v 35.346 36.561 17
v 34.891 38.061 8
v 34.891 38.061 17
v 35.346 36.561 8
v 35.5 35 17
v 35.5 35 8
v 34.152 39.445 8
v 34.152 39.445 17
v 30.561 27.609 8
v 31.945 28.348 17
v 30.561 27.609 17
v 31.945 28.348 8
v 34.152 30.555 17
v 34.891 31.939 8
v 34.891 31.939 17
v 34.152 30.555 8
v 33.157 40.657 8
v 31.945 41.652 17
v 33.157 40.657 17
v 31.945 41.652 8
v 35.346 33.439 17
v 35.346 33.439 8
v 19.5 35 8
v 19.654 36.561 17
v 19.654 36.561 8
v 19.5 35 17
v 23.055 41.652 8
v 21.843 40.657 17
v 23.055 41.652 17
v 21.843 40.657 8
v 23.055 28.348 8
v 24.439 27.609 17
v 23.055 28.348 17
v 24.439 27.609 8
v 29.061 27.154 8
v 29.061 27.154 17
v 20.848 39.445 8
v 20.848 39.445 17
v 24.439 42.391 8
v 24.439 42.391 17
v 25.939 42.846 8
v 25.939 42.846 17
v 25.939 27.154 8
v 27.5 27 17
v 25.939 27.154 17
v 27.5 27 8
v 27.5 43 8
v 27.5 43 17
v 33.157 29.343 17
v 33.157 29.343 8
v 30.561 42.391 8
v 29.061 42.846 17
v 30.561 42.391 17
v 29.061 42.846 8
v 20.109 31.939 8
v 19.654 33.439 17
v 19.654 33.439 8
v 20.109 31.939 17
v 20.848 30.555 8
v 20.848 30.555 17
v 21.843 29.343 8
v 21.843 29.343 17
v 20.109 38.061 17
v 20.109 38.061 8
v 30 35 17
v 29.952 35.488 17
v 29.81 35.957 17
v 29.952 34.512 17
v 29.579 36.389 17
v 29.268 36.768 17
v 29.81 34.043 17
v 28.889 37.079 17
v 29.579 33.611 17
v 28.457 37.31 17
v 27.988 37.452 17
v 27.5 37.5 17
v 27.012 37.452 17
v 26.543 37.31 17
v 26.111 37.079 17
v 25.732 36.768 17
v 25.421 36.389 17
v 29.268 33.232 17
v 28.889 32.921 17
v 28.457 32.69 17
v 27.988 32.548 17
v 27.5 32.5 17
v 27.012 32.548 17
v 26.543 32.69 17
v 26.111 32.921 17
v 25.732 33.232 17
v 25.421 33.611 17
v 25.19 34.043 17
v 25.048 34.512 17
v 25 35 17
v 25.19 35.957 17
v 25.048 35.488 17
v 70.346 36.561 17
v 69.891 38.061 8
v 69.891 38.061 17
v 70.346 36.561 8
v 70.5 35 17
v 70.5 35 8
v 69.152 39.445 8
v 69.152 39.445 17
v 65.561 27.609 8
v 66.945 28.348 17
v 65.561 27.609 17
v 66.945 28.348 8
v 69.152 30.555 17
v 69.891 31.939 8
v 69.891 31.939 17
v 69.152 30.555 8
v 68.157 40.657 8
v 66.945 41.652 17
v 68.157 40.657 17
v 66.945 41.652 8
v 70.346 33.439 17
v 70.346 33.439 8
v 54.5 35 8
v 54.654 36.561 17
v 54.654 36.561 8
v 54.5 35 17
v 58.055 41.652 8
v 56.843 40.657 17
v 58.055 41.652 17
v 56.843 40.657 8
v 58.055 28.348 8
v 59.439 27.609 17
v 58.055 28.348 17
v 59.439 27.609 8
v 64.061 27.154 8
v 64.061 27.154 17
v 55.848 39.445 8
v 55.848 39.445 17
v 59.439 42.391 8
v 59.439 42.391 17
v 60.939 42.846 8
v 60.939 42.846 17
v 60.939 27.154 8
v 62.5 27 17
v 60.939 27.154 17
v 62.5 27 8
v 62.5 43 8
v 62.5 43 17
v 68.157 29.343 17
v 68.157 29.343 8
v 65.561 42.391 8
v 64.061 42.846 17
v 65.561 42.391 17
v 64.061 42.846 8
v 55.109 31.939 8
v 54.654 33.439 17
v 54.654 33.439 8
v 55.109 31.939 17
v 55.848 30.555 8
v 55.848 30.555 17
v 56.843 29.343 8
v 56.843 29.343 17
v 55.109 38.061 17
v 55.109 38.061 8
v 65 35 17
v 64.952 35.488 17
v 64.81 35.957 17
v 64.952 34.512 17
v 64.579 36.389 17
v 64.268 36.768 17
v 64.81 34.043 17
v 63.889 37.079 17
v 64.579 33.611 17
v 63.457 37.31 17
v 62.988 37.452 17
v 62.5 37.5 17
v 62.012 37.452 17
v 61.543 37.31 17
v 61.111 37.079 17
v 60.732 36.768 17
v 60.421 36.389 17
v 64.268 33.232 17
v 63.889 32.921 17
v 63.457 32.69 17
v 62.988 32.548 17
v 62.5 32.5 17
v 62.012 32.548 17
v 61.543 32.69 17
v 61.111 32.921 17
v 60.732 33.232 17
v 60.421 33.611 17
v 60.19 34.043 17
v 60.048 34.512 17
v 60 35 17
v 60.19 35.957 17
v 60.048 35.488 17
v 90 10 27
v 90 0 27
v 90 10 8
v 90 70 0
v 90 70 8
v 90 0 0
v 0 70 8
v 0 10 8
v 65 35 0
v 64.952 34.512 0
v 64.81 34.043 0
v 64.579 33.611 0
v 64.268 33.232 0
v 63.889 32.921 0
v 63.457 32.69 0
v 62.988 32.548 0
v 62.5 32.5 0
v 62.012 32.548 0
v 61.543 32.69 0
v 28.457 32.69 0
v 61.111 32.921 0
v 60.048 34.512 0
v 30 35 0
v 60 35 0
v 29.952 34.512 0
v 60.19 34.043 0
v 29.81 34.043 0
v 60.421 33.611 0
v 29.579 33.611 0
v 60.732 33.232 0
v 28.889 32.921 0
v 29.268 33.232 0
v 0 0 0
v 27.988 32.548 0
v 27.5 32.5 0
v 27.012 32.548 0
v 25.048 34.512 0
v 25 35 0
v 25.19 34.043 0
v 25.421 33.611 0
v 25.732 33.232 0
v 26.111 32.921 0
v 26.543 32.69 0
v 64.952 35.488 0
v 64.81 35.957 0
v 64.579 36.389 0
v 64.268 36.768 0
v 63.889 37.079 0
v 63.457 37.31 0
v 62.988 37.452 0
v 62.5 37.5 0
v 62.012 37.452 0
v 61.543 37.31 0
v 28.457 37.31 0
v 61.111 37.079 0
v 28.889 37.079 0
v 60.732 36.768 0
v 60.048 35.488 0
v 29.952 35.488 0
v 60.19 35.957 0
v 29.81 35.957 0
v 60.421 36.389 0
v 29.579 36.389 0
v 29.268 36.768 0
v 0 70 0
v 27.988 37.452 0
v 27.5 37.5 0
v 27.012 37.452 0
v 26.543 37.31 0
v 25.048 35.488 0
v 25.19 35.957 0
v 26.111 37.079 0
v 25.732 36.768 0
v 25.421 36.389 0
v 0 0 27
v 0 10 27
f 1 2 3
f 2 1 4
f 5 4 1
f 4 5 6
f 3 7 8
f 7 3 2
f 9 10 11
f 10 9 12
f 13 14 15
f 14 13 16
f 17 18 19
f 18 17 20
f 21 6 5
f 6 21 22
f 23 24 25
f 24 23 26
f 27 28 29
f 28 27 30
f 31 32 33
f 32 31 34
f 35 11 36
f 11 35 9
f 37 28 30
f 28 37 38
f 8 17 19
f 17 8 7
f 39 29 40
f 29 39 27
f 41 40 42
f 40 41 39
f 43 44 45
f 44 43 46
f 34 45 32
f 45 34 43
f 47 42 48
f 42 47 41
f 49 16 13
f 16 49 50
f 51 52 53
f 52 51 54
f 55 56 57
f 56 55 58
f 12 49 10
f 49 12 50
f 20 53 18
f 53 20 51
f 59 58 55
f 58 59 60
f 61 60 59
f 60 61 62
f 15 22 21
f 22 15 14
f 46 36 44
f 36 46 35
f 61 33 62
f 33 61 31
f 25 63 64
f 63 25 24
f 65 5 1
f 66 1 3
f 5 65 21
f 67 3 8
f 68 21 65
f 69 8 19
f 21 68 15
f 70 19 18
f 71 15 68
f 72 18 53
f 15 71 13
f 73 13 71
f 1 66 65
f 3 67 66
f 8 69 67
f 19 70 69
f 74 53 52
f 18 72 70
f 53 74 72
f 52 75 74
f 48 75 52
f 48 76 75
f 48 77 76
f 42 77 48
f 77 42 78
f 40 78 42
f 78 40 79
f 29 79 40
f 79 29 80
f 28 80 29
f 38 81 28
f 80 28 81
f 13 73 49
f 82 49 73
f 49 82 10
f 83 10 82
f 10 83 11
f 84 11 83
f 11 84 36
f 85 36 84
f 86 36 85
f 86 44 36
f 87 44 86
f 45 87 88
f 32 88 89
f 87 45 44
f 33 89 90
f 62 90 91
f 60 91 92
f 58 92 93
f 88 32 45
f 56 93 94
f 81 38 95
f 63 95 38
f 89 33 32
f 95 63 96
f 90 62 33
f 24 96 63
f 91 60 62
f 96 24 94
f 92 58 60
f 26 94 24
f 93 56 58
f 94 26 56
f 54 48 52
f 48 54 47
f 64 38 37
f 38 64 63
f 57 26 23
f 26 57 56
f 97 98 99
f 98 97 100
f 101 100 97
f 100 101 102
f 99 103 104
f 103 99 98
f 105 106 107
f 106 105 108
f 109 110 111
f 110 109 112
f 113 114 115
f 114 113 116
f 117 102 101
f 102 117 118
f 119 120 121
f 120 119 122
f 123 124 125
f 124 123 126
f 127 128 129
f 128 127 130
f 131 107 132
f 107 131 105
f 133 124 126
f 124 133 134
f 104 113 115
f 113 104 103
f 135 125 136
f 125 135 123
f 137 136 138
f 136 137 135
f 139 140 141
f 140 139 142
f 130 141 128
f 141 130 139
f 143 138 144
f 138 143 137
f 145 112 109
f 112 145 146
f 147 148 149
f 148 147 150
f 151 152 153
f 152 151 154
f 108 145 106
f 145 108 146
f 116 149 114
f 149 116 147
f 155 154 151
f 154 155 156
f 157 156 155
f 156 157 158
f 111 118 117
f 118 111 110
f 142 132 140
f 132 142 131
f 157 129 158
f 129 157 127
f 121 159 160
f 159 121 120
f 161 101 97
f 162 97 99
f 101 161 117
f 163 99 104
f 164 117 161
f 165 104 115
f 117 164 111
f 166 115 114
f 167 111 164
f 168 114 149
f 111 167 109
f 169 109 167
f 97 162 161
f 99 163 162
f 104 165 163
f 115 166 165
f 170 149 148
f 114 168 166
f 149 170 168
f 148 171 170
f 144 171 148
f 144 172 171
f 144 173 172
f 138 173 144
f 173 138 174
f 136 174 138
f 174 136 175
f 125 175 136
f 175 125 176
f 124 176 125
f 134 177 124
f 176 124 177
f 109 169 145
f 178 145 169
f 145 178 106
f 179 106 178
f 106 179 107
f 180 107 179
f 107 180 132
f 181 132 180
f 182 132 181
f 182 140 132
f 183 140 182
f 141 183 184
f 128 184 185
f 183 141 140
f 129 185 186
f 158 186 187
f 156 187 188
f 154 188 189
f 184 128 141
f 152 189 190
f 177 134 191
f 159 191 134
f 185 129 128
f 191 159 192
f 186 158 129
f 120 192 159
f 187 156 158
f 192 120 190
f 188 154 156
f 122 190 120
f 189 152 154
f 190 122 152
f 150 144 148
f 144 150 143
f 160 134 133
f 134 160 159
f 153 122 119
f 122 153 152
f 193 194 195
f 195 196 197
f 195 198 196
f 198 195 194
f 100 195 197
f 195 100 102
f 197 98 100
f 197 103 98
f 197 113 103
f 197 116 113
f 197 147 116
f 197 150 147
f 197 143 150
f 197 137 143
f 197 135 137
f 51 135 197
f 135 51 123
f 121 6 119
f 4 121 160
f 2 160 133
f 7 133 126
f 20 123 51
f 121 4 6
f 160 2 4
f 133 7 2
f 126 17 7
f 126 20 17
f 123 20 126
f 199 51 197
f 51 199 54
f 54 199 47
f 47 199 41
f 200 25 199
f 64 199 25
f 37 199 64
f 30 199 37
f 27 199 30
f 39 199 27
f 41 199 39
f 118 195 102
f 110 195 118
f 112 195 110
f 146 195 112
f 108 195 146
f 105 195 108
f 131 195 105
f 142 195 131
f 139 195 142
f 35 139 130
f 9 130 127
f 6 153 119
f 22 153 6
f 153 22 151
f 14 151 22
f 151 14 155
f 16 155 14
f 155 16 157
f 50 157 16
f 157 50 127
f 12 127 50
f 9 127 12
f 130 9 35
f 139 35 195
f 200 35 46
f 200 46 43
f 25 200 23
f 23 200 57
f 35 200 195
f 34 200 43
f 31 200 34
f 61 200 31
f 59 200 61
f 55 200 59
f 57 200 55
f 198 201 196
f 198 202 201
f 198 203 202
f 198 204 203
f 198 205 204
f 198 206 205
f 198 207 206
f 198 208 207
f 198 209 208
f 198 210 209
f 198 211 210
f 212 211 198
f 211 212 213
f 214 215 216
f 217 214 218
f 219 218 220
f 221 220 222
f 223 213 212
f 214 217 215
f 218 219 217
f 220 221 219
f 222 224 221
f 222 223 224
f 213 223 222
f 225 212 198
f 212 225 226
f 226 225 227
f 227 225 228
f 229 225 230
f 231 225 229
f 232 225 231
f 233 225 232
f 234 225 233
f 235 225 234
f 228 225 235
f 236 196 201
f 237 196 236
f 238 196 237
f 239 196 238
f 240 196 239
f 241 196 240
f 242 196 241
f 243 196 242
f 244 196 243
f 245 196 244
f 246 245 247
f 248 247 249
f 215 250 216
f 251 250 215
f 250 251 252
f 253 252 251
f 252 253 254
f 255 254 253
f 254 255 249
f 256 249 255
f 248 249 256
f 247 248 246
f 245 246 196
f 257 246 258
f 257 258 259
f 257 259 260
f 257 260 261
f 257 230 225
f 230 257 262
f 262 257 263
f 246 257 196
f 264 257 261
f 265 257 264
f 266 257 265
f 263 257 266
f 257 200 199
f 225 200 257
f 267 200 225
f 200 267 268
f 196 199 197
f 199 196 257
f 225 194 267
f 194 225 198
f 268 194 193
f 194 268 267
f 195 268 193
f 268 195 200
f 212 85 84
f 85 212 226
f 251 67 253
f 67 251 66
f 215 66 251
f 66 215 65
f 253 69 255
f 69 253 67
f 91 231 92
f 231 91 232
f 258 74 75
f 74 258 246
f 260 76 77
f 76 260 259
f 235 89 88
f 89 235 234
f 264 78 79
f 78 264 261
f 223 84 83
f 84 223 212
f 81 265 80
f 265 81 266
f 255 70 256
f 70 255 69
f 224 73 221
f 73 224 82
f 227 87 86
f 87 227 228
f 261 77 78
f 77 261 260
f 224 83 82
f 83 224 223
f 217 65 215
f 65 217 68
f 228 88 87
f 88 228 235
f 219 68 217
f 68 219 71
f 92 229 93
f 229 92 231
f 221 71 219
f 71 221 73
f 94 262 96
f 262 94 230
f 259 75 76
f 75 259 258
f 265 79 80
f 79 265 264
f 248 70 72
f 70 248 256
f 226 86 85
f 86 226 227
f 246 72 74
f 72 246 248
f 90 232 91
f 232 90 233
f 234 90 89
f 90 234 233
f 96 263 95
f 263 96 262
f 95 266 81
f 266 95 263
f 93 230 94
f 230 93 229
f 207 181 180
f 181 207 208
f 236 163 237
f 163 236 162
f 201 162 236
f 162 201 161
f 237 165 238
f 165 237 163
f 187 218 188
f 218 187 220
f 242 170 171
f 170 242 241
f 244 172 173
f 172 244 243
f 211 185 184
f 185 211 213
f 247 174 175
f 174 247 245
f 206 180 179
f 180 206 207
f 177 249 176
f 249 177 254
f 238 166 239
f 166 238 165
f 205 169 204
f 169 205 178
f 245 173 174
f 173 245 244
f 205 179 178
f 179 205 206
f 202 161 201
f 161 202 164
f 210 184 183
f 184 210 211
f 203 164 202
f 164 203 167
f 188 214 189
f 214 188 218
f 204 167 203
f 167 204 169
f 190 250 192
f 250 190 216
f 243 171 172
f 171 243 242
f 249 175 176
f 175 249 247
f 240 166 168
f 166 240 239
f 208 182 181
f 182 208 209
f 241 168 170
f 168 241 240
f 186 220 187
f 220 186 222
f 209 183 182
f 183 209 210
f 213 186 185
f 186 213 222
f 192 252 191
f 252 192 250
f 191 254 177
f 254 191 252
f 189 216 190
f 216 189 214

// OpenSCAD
$fn = 32;

// ----------------------------------------------------------------------
// Drill jig: fence jig
// ----------------------------------------------------------------------

// --- parameters (mm) ---
plate_l = 90;             // plate length, X
plate_w = 70;             // plate width, Y
plate_t = 8;              // plate thickness
boss_d = 16;              // guide boss diameter
boss_h = 10;              // boss height above the plate
guide_d = 5;              // guide hole diameter
boss_pitch = 35;          // boss pitch
fence_h = 20;             // fence height above the plate
fence_t = 10;             // fence thickness

n_boss = 2;  // guide bosses
boss_x0 = (plate_l - (n_boss - 1) * boss_pitch) / 2;  // first boss X
boss_top = plate_t - 1 + boss_h;  // boss crown height
fence_top = plate_t - 1 + fence_h;  // fence crown height
total_h = max([fence_top, boss_top]);  // overall height

difference() {
  union() {
  cube([plate_l, plate_w, plate_t]);
  for (i = [0 : n_boss - 1])
    translate([boss_x0 + i * boss_pitch, plate_w / 2, plate_t - 1])
      cylinder(h = boss_h, d = boss_d);
  translate([0, 0, plate_t - 1]) cube([plate_l, fence_t, fence_h]);
  }
  for (i = [0 : n_boss - 1])
    translate([boss_x0 + i * boss_pitch, plate_w / 2, -1])
      cylinder(h = plate_t + boss_h, d = guide_d);
}
